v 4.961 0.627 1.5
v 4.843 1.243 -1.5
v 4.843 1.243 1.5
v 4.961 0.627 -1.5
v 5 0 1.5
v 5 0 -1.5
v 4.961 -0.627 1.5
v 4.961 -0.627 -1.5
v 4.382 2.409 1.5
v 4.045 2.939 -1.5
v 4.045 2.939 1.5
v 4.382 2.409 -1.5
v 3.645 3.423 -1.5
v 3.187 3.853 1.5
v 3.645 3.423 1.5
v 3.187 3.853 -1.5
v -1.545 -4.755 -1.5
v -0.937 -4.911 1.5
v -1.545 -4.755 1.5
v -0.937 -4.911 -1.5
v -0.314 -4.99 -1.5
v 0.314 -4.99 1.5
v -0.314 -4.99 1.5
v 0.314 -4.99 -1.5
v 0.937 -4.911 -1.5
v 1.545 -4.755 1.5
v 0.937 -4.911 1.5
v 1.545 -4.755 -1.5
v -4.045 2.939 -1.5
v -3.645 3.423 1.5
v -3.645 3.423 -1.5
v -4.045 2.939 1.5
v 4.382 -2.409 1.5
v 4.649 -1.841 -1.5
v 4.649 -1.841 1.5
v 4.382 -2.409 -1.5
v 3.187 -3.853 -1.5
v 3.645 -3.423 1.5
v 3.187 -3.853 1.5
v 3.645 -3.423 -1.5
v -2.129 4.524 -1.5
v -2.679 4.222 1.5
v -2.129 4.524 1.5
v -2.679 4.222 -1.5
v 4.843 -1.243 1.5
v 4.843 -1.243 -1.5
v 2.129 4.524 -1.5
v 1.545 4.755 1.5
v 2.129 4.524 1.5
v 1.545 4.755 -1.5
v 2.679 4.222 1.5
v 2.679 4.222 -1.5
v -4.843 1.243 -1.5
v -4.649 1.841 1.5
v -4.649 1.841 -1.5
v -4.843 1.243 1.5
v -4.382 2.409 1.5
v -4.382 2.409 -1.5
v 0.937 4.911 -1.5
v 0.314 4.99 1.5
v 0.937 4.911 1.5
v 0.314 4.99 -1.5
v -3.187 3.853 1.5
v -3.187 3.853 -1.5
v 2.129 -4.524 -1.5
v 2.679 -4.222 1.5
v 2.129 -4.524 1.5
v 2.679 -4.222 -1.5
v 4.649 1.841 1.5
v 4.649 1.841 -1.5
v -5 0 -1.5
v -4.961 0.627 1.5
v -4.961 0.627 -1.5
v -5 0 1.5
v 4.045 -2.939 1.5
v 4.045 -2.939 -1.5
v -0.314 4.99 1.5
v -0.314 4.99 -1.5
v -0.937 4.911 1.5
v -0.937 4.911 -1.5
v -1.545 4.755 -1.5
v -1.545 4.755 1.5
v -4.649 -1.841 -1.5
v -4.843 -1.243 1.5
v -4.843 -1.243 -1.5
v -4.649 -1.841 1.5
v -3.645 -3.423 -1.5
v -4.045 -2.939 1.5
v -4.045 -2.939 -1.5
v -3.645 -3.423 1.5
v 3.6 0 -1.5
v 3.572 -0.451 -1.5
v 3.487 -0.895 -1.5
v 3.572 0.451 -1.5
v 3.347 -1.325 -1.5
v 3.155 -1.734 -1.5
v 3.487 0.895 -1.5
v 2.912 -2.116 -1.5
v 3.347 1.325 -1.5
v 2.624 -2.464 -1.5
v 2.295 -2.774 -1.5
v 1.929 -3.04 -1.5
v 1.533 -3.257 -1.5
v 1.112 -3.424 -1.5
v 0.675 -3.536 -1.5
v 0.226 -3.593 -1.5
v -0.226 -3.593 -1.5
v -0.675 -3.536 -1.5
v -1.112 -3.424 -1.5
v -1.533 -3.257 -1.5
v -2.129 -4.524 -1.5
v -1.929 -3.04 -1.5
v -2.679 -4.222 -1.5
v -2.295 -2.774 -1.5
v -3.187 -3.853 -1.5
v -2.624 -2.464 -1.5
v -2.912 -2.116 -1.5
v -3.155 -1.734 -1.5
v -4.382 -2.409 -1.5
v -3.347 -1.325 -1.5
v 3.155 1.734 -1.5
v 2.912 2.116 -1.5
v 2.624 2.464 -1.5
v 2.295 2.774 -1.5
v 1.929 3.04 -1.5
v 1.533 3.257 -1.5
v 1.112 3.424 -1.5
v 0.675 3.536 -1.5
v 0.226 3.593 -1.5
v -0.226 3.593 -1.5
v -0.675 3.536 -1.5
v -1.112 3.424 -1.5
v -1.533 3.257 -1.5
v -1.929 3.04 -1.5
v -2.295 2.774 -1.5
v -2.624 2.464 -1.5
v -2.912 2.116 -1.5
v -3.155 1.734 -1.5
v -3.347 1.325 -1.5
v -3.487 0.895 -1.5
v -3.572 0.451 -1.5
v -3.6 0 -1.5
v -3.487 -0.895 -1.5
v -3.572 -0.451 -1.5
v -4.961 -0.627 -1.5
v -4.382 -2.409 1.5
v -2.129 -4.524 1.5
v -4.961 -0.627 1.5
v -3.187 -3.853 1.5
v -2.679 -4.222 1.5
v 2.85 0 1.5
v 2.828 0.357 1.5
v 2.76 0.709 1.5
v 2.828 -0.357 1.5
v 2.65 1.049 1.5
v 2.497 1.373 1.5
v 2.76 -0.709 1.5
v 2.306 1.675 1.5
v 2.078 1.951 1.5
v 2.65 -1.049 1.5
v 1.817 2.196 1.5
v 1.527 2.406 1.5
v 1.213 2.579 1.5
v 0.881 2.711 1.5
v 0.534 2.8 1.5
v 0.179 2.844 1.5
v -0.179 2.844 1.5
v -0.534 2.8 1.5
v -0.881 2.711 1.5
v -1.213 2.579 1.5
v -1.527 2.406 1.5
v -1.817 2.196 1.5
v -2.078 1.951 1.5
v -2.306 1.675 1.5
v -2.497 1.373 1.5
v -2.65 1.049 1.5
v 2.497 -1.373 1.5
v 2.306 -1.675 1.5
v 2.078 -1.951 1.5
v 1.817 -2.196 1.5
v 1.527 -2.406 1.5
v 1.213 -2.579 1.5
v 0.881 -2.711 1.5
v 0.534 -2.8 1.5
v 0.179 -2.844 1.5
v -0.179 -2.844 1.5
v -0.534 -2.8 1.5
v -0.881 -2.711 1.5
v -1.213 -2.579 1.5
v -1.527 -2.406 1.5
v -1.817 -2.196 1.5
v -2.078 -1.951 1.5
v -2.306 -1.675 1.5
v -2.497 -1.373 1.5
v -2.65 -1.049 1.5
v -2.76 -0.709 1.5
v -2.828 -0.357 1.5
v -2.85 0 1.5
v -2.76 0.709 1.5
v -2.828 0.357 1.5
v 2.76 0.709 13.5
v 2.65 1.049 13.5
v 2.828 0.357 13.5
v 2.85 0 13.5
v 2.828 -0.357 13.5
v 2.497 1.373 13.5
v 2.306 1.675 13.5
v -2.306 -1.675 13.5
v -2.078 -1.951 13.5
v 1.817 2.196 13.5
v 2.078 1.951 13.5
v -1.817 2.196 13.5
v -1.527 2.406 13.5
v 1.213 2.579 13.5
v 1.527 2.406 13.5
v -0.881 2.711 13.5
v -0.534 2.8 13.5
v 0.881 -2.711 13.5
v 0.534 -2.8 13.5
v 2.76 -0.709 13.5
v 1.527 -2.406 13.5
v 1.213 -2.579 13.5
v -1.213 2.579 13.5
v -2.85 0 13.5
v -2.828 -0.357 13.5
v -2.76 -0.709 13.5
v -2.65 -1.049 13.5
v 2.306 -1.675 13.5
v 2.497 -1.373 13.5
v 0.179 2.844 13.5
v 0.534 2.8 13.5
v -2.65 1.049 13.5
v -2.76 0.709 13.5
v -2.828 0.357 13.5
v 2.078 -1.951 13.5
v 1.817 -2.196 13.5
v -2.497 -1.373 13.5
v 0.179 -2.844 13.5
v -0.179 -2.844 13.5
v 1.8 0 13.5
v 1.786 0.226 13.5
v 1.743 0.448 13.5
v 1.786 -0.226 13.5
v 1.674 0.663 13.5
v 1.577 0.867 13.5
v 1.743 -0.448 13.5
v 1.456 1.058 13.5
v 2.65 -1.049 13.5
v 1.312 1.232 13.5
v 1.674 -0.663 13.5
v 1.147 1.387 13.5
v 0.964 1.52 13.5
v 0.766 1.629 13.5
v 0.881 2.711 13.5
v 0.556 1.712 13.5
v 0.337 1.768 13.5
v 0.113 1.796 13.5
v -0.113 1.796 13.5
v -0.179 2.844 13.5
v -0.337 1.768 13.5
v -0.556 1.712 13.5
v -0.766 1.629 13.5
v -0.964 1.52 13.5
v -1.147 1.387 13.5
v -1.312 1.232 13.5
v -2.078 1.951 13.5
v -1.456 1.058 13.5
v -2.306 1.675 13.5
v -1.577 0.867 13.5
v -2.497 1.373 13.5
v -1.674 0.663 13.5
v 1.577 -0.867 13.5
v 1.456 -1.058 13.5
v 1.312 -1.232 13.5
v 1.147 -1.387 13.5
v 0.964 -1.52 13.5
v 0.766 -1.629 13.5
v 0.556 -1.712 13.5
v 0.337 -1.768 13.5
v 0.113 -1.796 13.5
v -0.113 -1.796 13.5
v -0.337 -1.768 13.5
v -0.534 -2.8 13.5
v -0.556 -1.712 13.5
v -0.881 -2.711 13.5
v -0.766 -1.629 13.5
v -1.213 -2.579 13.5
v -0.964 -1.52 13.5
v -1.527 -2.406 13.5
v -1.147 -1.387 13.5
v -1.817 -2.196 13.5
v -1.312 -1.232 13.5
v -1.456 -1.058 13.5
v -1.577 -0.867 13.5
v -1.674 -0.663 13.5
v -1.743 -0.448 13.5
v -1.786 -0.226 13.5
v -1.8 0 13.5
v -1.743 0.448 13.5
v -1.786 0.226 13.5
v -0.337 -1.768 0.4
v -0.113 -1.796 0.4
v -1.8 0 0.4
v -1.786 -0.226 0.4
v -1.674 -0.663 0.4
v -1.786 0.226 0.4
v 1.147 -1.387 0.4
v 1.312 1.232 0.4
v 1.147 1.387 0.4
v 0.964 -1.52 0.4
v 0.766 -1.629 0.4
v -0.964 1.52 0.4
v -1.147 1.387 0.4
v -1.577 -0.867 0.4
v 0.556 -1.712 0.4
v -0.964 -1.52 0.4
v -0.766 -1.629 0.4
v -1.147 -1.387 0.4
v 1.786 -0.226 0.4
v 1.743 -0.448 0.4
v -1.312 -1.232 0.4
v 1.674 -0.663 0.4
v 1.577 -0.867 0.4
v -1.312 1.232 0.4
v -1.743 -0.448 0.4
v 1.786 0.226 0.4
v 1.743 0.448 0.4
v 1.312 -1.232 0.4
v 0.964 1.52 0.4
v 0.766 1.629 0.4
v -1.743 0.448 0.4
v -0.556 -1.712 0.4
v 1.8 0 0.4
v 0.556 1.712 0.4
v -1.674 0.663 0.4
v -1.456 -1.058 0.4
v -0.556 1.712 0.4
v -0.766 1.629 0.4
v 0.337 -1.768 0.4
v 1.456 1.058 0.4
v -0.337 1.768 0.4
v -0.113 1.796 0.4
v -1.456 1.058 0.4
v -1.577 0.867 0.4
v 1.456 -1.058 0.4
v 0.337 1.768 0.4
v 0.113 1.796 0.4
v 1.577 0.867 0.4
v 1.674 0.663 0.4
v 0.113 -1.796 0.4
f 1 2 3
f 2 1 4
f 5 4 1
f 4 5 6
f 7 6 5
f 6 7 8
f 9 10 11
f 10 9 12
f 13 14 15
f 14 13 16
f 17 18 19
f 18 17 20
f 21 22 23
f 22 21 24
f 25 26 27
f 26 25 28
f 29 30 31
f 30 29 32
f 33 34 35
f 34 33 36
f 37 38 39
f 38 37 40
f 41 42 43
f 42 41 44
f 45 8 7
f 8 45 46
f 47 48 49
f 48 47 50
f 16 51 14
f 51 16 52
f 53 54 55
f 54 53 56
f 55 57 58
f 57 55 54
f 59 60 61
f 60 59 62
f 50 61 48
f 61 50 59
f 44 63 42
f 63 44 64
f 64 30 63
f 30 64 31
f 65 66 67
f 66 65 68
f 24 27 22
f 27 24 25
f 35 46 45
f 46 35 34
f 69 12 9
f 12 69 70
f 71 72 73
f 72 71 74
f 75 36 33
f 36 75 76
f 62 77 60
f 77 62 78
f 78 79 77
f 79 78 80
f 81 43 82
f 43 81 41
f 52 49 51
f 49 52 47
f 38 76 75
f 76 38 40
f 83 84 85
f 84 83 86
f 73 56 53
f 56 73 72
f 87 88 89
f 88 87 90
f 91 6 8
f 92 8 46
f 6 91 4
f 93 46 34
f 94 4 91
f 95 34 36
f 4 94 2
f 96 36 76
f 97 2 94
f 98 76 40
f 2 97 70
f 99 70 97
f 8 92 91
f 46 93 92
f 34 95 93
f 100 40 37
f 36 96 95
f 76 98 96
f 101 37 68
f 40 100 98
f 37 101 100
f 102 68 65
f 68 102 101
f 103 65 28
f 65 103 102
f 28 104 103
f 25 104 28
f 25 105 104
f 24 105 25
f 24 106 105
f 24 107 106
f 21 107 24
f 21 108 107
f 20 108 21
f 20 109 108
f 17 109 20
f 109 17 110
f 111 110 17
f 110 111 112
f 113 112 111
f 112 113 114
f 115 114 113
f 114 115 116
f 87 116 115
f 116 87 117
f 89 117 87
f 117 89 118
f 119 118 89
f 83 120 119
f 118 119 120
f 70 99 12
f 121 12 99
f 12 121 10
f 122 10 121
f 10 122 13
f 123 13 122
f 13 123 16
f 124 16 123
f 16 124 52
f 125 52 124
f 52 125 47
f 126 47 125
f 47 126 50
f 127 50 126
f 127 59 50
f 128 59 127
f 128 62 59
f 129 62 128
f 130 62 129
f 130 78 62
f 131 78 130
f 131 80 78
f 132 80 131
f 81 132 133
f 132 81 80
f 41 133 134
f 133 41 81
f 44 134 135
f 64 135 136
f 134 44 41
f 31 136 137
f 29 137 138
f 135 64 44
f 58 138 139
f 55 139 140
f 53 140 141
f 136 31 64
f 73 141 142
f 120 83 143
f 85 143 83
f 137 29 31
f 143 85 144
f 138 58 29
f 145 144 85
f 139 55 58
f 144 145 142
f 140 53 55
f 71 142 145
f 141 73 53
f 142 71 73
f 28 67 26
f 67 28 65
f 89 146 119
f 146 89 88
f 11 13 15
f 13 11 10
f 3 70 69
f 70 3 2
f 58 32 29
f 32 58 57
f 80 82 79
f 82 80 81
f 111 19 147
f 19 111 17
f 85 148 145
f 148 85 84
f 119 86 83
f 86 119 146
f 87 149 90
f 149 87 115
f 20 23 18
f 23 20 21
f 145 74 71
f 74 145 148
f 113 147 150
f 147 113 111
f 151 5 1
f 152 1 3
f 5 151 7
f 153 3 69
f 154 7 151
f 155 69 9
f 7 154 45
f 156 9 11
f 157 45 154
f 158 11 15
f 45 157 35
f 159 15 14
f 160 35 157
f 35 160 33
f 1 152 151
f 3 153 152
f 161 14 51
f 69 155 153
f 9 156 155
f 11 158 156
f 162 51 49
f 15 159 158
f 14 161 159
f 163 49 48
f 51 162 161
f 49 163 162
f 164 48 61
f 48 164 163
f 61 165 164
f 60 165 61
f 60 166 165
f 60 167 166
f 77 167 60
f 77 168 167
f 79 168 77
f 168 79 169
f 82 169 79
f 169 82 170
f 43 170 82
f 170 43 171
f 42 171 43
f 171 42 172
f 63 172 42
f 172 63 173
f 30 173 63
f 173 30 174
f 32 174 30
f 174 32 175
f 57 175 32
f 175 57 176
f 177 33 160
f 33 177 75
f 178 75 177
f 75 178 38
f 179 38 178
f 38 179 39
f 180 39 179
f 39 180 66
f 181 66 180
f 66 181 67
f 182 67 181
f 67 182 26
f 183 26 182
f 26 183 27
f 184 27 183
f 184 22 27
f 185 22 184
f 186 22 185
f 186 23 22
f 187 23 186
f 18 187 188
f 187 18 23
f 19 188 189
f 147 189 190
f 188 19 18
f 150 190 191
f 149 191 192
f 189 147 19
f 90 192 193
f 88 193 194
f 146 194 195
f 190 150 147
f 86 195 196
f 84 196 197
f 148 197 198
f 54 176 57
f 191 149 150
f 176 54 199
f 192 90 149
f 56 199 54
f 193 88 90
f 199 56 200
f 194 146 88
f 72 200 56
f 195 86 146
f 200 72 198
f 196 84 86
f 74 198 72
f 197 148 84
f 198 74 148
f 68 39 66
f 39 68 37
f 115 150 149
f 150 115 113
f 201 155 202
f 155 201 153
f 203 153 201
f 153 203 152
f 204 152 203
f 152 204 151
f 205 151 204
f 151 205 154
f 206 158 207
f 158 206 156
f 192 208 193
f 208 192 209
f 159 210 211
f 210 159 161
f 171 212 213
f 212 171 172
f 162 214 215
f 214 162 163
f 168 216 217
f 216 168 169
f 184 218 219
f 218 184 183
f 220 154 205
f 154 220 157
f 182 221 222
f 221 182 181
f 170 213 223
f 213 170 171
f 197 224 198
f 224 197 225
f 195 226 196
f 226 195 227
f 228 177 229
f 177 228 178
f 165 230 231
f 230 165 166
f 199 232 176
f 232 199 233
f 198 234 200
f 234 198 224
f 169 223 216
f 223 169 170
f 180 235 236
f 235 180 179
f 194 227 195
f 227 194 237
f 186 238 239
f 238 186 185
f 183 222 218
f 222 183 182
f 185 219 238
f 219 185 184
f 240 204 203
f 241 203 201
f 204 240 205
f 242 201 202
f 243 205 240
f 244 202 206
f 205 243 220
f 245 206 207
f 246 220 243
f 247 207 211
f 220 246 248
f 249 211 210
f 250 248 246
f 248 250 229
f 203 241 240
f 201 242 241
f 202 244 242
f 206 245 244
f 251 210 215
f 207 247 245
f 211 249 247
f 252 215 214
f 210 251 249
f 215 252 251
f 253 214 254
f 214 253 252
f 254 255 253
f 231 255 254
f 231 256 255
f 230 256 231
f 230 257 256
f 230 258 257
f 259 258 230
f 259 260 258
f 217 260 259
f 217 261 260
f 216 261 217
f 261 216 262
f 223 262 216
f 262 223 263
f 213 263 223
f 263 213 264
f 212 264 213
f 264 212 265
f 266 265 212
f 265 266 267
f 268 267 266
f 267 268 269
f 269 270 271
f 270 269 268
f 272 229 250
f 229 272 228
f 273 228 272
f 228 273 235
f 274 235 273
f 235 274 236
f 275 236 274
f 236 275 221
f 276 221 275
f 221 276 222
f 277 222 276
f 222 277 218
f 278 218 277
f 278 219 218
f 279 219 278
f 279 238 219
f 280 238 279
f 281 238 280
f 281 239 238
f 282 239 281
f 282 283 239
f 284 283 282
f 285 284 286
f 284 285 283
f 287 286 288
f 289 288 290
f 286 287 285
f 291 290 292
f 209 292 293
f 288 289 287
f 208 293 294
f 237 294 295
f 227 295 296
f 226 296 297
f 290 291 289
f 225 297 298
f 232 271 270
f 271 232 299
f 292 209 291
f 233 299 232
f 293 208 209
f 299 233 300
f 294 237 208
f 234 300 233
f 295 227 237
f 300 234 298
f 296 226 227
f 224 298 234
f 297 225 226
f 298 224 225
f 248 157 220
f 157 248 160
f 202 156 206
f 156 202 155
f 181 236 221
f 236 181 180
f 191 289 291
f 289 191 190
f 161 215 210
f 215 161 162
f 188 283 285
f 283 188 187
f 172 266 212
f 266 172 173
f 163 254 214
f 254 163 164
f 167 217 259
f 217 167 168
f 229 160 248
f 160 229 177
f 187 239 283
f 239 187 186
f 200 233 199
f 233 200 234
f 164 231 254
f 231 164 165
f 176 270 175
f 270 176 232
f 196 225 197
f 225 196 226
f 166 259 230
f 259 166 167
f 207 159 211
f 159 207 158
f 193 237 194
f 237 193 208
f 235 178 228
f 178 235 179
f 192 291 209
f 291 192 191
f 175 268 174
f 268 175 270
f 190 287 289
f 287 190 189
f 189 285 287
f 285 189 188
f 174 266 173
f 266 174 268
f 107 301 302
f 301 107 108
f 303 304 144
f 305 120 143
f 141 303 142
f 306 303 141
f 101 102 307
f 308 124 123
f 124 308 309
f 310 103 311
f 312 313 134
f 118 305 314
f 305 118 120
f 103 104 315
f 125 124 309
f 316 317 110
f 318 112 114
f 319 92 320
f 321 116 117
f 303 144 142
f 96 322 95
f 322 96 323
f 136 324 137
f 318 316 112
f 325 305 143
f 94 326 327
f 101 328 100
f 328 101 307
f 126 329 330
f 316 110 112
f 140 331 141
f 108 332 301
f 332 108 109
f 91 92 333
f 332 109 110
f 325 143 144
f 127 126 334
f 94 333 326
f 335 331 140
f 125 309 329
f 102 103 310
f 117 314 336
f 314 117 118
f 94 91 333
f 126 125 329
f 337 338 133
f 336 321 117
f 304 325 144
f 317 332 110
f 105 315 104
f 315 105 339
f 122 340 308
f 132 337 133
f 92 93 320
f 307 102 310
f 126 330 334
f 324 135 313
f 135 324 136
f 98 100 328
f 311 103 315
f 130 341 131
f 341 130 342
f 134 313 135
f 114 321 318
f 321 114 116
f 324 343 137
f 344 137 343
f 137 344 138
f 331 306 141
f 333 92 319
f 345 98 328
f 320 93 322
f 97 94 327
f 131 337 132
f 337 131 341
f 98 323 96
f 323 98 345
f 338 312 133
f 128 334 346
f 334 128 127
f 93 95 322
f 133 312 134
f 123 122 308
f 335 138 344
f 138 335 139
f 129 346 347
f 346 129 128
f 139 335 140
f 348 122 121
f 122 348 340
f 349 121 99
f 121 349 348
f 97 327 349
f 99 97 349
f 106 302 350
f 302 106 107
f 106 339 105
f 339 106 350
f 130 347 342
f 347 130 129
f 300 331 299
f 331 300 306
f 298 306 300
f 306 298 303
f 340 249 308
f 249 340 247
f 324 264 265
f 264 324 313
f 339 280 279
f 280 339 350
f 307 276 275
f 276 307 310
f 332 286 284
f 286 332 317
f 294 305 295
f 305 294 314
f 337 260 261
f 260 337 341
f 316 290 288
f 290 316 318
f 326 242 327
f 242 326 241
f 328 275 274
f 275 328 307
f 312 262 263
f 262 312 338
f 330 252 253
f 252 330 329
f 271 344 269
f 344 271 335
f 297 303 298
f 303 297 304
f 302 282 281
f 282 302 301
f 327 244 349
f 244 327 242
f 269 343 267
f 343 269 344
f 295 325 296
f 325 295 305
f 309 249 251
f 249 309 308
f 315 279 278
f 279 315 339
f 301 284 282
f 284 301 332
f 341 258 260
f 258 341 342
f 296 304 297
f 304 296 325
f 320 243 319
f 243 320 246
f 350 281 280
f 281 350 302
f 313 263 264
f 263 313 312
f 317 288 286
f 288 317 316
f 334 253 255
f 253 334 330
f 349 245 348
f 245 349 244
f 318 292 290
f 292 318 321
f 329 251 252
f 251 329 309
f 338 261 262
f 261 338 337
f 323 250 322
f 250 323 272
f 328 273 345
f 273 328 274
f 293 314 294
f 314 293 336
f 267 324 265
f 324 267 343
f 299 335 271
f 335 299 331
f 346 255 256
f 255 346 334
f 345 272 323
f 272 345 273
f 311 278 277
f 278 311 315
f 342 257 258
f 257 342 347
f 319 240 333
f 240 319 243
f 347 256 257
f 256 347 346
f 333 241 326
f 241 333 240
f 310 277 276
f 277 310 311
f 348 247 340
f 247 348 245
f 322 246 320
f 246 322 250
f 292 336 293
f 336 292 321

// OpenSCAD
$fn = 50;


difference() {
	union() {
		translate(v = [0, 0, -1.5000000000]) {
			cylinder(h = 3, r = 5.0000000000);
		}
		translate(v = [0, 0, -1.5000000000]) {
			cylinder(h = 15, r = 2.8500000000);
		}
	}
	union() {
		translate(v = [0, 0, -1.5000000000]) {
			rotate(a = [0, 180, 0]) {
				difference() {
					union() {
						translate(v = [0, 0, -15.0000000000]) {
							cylinder(h = 15, r = 1.5000000000);
						}
						translate(v = [0, 0, -1.9000000000]) {
							cylinder(h = 1.9000000000, r1 = 1.8000000000, r2 = 3.6000000000);
						}
						translate(v = [0, 0, -15.0000000000]) {
							cylinder(h = 15, r = 1.8000000000);
						}
						translate(v = [0, 0, -15.0000000000]) {
							cylinder(h = 15, r = 1.5000000000);
						}
					}
					union();
				}
			}
		}
		translate(v = [0, 0, -50.0000000000]) {
			cylinder(h = 100, r = 1.8000000000);
		}
	}
}
